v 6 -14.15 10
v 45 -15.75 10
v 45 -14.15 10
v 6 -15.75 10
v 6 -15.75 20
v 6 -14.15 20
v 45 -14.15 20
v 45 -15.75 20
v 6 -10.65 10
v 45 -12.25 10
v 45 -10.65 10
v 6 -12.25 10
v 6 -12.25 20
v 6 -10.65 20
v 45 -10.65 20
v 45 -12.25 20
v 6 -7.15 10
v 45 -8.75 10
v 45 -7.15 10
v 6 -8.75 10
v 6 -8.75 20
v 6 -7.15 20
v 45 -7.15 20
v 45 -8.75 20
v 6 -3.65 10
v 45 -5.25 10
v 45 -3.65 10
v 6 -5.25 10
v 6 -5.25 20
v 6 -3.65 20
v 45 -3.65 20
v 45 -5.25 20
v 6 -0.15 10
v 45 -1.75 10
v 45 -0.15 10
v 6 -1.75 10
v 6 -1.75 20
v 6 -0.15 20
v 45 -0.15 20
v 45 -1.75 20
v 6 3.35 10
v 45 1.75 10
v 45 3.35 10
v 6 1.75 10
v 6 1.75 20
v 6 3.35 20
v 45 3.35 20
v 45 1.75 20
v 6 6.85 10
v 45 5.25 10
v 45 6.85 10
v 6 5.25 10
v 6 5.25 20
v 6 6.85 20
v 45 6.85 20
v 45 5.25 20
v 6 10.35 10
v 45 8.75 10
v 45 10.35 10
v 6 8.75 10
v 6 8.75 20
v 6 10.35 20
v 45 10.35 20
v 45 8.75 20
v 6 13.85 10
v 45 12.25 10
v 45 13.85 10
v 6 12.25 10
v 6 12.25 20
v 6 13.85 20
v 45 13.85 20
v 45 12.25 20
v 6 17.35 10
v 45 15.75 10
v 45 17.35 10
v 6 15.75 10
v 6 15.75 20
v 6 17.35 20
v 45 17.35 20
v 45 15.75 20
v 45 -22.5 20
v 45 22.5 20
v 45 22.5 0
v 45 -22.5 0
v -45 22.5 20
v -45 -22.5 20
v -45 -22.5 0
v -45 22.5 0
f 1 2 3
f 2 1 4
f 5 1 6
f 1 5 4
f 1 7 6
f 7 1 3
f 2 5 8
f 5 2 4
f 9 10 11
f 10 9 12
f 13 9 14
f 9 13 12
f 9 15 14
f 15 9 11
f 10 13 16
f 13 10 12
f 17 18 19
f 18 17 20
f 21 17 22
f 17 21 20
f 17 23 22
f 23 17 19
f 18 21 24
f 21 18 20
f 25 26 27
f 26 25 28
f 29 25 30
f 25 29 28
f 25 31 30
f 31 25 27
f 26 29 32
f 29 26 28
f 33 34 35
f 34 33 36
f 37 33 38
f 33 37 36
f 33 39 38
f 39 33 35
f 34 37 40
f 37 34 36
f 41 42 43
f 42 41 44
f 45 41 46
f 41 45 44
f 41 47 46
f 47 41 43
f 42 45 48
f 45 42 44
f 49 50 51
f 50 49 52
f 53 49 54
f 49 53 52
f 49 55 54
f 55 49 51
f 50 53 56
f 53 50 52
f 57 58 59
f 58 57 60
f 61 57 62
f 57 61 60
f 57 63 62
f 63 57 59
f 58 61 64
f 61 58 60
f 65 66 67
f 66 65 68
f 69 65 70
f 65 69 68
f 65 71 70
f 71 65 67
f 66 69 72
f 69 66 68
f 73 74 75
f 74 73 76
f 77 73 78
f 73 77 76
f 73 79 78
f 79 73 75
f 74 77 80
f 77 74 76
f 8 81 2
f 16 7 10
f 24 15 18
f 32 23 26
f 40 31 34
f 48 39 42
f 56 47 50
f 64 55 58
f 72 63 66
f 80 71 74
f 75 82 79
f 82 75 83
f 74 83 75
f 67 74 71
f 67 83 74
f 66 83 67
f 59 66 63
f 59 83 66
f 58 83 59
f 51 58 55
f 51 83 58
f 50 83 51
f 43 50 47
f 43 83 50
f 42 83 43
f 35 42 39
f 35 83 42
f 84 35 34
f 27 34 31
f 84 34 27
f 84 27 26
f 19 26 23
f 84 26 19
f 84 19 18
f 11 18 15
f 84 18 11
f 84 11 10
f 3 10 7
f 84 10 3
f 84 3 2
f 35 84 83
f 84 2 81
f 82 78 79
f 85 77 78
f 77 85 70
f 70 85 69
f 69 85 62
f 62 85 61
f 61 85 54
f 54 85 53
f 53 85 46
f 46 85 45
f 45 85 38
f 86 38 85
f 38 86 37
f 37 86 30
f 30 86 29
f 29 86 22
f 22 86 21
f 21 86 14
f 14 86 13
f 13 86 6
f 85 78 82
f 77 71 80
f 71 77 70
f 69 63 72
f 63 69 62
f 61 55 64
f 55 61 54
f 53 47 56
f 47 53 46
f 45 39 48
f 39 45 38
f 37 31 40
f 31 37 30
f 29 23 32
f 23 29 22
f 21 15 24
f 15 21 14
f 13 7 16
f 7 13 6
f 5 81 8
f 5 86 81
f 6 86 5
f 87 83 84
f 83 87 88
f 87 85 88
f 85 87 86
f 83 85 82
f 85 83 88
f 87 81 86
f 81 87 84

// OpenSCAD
// Slide drying rack - holds 10 microscope slides (75 x 25 x 1 mm) upright on their long edge
// Print orientation: base block on the bed (z = 0), slots open upward (+Z)

// ---------------- Parameters ----------------
block_len    = 90;    // block length along X (mm)
block_wid    = 45;    // block width along Y (mm)
block_hgt    = 20;    // block height along Z (mm)

slot_len     = 77;    // slot length along X (mm)
slot_wid     = 1.6;   // slot width along Y (mm)
slot_depth   = 10;    // slot depth from top face (mm)
slot_pitch   = 3.5;   // centre-to-centre spacing of slots in Y (mm)
slot_count   = 10;    // number of slots

eps          = 0.5;   // overshoot of cutters past the top face (mm)
$fn          = 96;    // circle resolution (no curves here, set per the rules)

// ---------------- Derived ----------------
first_y = -(slot_count - 1) * slot_pitch / 2;   // Y of first slot, groups centred in Y
x_margin = (block_len - slot_len) / 2;          // X margin of slot in the block (11.5 mm)

// ---------------- Model ----------------
difference() {
    // Base block, centred in X and Y, sitting on z = 0
    translate([-block_len / 2, -block_wid / 2, 0])
        cube([block_len, block_wid, block_hgt]);

    // Parallel slots, open at the top
    for (i = [0 : slot_count - 1]) {
        translate([x_margin - eps, first_y + i * slot_pitch, block_hgt - slot_depth])
            cube([slot_len + 2 * eps, slot_wid, slot_depth + eps]);
    }
}
